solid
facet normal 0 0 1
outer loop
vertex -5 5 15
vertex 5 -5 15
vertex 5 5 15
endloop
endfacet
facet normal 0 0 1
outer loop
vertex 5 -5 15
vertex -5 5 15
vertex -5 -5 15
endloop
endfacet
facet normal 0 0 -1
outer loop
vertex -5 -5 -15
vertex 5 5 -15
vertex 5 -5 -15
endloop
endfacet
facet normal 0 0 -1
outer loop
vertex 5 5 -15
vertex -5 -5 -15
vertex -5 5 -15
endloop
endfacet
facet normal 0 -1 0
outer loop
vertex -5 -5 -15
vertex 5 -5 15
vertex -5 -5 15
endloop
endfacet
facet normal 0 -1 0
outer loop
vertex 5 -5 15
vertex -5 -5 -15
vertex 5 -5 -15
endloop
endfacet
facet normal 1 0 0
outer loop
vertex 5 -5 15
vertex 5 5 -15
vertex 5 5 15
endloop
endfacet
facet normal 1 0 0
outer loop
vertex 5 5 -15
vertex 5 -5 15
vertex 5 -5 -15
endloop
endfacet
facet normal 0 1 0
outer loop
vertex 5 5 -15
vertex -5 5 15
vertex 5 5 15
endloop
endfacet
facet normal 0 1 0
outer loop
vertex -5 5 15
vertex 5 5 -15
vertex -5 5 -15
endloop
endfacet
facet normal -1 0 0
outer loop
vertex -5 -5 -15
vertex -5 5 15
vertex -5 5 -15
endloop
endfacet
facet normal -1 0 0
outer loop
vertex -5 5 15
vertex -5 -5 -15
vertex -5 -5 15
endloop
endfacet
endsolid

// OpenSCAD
length = 30; // [30:1:50]
cube([10, 10, length], center = true);
